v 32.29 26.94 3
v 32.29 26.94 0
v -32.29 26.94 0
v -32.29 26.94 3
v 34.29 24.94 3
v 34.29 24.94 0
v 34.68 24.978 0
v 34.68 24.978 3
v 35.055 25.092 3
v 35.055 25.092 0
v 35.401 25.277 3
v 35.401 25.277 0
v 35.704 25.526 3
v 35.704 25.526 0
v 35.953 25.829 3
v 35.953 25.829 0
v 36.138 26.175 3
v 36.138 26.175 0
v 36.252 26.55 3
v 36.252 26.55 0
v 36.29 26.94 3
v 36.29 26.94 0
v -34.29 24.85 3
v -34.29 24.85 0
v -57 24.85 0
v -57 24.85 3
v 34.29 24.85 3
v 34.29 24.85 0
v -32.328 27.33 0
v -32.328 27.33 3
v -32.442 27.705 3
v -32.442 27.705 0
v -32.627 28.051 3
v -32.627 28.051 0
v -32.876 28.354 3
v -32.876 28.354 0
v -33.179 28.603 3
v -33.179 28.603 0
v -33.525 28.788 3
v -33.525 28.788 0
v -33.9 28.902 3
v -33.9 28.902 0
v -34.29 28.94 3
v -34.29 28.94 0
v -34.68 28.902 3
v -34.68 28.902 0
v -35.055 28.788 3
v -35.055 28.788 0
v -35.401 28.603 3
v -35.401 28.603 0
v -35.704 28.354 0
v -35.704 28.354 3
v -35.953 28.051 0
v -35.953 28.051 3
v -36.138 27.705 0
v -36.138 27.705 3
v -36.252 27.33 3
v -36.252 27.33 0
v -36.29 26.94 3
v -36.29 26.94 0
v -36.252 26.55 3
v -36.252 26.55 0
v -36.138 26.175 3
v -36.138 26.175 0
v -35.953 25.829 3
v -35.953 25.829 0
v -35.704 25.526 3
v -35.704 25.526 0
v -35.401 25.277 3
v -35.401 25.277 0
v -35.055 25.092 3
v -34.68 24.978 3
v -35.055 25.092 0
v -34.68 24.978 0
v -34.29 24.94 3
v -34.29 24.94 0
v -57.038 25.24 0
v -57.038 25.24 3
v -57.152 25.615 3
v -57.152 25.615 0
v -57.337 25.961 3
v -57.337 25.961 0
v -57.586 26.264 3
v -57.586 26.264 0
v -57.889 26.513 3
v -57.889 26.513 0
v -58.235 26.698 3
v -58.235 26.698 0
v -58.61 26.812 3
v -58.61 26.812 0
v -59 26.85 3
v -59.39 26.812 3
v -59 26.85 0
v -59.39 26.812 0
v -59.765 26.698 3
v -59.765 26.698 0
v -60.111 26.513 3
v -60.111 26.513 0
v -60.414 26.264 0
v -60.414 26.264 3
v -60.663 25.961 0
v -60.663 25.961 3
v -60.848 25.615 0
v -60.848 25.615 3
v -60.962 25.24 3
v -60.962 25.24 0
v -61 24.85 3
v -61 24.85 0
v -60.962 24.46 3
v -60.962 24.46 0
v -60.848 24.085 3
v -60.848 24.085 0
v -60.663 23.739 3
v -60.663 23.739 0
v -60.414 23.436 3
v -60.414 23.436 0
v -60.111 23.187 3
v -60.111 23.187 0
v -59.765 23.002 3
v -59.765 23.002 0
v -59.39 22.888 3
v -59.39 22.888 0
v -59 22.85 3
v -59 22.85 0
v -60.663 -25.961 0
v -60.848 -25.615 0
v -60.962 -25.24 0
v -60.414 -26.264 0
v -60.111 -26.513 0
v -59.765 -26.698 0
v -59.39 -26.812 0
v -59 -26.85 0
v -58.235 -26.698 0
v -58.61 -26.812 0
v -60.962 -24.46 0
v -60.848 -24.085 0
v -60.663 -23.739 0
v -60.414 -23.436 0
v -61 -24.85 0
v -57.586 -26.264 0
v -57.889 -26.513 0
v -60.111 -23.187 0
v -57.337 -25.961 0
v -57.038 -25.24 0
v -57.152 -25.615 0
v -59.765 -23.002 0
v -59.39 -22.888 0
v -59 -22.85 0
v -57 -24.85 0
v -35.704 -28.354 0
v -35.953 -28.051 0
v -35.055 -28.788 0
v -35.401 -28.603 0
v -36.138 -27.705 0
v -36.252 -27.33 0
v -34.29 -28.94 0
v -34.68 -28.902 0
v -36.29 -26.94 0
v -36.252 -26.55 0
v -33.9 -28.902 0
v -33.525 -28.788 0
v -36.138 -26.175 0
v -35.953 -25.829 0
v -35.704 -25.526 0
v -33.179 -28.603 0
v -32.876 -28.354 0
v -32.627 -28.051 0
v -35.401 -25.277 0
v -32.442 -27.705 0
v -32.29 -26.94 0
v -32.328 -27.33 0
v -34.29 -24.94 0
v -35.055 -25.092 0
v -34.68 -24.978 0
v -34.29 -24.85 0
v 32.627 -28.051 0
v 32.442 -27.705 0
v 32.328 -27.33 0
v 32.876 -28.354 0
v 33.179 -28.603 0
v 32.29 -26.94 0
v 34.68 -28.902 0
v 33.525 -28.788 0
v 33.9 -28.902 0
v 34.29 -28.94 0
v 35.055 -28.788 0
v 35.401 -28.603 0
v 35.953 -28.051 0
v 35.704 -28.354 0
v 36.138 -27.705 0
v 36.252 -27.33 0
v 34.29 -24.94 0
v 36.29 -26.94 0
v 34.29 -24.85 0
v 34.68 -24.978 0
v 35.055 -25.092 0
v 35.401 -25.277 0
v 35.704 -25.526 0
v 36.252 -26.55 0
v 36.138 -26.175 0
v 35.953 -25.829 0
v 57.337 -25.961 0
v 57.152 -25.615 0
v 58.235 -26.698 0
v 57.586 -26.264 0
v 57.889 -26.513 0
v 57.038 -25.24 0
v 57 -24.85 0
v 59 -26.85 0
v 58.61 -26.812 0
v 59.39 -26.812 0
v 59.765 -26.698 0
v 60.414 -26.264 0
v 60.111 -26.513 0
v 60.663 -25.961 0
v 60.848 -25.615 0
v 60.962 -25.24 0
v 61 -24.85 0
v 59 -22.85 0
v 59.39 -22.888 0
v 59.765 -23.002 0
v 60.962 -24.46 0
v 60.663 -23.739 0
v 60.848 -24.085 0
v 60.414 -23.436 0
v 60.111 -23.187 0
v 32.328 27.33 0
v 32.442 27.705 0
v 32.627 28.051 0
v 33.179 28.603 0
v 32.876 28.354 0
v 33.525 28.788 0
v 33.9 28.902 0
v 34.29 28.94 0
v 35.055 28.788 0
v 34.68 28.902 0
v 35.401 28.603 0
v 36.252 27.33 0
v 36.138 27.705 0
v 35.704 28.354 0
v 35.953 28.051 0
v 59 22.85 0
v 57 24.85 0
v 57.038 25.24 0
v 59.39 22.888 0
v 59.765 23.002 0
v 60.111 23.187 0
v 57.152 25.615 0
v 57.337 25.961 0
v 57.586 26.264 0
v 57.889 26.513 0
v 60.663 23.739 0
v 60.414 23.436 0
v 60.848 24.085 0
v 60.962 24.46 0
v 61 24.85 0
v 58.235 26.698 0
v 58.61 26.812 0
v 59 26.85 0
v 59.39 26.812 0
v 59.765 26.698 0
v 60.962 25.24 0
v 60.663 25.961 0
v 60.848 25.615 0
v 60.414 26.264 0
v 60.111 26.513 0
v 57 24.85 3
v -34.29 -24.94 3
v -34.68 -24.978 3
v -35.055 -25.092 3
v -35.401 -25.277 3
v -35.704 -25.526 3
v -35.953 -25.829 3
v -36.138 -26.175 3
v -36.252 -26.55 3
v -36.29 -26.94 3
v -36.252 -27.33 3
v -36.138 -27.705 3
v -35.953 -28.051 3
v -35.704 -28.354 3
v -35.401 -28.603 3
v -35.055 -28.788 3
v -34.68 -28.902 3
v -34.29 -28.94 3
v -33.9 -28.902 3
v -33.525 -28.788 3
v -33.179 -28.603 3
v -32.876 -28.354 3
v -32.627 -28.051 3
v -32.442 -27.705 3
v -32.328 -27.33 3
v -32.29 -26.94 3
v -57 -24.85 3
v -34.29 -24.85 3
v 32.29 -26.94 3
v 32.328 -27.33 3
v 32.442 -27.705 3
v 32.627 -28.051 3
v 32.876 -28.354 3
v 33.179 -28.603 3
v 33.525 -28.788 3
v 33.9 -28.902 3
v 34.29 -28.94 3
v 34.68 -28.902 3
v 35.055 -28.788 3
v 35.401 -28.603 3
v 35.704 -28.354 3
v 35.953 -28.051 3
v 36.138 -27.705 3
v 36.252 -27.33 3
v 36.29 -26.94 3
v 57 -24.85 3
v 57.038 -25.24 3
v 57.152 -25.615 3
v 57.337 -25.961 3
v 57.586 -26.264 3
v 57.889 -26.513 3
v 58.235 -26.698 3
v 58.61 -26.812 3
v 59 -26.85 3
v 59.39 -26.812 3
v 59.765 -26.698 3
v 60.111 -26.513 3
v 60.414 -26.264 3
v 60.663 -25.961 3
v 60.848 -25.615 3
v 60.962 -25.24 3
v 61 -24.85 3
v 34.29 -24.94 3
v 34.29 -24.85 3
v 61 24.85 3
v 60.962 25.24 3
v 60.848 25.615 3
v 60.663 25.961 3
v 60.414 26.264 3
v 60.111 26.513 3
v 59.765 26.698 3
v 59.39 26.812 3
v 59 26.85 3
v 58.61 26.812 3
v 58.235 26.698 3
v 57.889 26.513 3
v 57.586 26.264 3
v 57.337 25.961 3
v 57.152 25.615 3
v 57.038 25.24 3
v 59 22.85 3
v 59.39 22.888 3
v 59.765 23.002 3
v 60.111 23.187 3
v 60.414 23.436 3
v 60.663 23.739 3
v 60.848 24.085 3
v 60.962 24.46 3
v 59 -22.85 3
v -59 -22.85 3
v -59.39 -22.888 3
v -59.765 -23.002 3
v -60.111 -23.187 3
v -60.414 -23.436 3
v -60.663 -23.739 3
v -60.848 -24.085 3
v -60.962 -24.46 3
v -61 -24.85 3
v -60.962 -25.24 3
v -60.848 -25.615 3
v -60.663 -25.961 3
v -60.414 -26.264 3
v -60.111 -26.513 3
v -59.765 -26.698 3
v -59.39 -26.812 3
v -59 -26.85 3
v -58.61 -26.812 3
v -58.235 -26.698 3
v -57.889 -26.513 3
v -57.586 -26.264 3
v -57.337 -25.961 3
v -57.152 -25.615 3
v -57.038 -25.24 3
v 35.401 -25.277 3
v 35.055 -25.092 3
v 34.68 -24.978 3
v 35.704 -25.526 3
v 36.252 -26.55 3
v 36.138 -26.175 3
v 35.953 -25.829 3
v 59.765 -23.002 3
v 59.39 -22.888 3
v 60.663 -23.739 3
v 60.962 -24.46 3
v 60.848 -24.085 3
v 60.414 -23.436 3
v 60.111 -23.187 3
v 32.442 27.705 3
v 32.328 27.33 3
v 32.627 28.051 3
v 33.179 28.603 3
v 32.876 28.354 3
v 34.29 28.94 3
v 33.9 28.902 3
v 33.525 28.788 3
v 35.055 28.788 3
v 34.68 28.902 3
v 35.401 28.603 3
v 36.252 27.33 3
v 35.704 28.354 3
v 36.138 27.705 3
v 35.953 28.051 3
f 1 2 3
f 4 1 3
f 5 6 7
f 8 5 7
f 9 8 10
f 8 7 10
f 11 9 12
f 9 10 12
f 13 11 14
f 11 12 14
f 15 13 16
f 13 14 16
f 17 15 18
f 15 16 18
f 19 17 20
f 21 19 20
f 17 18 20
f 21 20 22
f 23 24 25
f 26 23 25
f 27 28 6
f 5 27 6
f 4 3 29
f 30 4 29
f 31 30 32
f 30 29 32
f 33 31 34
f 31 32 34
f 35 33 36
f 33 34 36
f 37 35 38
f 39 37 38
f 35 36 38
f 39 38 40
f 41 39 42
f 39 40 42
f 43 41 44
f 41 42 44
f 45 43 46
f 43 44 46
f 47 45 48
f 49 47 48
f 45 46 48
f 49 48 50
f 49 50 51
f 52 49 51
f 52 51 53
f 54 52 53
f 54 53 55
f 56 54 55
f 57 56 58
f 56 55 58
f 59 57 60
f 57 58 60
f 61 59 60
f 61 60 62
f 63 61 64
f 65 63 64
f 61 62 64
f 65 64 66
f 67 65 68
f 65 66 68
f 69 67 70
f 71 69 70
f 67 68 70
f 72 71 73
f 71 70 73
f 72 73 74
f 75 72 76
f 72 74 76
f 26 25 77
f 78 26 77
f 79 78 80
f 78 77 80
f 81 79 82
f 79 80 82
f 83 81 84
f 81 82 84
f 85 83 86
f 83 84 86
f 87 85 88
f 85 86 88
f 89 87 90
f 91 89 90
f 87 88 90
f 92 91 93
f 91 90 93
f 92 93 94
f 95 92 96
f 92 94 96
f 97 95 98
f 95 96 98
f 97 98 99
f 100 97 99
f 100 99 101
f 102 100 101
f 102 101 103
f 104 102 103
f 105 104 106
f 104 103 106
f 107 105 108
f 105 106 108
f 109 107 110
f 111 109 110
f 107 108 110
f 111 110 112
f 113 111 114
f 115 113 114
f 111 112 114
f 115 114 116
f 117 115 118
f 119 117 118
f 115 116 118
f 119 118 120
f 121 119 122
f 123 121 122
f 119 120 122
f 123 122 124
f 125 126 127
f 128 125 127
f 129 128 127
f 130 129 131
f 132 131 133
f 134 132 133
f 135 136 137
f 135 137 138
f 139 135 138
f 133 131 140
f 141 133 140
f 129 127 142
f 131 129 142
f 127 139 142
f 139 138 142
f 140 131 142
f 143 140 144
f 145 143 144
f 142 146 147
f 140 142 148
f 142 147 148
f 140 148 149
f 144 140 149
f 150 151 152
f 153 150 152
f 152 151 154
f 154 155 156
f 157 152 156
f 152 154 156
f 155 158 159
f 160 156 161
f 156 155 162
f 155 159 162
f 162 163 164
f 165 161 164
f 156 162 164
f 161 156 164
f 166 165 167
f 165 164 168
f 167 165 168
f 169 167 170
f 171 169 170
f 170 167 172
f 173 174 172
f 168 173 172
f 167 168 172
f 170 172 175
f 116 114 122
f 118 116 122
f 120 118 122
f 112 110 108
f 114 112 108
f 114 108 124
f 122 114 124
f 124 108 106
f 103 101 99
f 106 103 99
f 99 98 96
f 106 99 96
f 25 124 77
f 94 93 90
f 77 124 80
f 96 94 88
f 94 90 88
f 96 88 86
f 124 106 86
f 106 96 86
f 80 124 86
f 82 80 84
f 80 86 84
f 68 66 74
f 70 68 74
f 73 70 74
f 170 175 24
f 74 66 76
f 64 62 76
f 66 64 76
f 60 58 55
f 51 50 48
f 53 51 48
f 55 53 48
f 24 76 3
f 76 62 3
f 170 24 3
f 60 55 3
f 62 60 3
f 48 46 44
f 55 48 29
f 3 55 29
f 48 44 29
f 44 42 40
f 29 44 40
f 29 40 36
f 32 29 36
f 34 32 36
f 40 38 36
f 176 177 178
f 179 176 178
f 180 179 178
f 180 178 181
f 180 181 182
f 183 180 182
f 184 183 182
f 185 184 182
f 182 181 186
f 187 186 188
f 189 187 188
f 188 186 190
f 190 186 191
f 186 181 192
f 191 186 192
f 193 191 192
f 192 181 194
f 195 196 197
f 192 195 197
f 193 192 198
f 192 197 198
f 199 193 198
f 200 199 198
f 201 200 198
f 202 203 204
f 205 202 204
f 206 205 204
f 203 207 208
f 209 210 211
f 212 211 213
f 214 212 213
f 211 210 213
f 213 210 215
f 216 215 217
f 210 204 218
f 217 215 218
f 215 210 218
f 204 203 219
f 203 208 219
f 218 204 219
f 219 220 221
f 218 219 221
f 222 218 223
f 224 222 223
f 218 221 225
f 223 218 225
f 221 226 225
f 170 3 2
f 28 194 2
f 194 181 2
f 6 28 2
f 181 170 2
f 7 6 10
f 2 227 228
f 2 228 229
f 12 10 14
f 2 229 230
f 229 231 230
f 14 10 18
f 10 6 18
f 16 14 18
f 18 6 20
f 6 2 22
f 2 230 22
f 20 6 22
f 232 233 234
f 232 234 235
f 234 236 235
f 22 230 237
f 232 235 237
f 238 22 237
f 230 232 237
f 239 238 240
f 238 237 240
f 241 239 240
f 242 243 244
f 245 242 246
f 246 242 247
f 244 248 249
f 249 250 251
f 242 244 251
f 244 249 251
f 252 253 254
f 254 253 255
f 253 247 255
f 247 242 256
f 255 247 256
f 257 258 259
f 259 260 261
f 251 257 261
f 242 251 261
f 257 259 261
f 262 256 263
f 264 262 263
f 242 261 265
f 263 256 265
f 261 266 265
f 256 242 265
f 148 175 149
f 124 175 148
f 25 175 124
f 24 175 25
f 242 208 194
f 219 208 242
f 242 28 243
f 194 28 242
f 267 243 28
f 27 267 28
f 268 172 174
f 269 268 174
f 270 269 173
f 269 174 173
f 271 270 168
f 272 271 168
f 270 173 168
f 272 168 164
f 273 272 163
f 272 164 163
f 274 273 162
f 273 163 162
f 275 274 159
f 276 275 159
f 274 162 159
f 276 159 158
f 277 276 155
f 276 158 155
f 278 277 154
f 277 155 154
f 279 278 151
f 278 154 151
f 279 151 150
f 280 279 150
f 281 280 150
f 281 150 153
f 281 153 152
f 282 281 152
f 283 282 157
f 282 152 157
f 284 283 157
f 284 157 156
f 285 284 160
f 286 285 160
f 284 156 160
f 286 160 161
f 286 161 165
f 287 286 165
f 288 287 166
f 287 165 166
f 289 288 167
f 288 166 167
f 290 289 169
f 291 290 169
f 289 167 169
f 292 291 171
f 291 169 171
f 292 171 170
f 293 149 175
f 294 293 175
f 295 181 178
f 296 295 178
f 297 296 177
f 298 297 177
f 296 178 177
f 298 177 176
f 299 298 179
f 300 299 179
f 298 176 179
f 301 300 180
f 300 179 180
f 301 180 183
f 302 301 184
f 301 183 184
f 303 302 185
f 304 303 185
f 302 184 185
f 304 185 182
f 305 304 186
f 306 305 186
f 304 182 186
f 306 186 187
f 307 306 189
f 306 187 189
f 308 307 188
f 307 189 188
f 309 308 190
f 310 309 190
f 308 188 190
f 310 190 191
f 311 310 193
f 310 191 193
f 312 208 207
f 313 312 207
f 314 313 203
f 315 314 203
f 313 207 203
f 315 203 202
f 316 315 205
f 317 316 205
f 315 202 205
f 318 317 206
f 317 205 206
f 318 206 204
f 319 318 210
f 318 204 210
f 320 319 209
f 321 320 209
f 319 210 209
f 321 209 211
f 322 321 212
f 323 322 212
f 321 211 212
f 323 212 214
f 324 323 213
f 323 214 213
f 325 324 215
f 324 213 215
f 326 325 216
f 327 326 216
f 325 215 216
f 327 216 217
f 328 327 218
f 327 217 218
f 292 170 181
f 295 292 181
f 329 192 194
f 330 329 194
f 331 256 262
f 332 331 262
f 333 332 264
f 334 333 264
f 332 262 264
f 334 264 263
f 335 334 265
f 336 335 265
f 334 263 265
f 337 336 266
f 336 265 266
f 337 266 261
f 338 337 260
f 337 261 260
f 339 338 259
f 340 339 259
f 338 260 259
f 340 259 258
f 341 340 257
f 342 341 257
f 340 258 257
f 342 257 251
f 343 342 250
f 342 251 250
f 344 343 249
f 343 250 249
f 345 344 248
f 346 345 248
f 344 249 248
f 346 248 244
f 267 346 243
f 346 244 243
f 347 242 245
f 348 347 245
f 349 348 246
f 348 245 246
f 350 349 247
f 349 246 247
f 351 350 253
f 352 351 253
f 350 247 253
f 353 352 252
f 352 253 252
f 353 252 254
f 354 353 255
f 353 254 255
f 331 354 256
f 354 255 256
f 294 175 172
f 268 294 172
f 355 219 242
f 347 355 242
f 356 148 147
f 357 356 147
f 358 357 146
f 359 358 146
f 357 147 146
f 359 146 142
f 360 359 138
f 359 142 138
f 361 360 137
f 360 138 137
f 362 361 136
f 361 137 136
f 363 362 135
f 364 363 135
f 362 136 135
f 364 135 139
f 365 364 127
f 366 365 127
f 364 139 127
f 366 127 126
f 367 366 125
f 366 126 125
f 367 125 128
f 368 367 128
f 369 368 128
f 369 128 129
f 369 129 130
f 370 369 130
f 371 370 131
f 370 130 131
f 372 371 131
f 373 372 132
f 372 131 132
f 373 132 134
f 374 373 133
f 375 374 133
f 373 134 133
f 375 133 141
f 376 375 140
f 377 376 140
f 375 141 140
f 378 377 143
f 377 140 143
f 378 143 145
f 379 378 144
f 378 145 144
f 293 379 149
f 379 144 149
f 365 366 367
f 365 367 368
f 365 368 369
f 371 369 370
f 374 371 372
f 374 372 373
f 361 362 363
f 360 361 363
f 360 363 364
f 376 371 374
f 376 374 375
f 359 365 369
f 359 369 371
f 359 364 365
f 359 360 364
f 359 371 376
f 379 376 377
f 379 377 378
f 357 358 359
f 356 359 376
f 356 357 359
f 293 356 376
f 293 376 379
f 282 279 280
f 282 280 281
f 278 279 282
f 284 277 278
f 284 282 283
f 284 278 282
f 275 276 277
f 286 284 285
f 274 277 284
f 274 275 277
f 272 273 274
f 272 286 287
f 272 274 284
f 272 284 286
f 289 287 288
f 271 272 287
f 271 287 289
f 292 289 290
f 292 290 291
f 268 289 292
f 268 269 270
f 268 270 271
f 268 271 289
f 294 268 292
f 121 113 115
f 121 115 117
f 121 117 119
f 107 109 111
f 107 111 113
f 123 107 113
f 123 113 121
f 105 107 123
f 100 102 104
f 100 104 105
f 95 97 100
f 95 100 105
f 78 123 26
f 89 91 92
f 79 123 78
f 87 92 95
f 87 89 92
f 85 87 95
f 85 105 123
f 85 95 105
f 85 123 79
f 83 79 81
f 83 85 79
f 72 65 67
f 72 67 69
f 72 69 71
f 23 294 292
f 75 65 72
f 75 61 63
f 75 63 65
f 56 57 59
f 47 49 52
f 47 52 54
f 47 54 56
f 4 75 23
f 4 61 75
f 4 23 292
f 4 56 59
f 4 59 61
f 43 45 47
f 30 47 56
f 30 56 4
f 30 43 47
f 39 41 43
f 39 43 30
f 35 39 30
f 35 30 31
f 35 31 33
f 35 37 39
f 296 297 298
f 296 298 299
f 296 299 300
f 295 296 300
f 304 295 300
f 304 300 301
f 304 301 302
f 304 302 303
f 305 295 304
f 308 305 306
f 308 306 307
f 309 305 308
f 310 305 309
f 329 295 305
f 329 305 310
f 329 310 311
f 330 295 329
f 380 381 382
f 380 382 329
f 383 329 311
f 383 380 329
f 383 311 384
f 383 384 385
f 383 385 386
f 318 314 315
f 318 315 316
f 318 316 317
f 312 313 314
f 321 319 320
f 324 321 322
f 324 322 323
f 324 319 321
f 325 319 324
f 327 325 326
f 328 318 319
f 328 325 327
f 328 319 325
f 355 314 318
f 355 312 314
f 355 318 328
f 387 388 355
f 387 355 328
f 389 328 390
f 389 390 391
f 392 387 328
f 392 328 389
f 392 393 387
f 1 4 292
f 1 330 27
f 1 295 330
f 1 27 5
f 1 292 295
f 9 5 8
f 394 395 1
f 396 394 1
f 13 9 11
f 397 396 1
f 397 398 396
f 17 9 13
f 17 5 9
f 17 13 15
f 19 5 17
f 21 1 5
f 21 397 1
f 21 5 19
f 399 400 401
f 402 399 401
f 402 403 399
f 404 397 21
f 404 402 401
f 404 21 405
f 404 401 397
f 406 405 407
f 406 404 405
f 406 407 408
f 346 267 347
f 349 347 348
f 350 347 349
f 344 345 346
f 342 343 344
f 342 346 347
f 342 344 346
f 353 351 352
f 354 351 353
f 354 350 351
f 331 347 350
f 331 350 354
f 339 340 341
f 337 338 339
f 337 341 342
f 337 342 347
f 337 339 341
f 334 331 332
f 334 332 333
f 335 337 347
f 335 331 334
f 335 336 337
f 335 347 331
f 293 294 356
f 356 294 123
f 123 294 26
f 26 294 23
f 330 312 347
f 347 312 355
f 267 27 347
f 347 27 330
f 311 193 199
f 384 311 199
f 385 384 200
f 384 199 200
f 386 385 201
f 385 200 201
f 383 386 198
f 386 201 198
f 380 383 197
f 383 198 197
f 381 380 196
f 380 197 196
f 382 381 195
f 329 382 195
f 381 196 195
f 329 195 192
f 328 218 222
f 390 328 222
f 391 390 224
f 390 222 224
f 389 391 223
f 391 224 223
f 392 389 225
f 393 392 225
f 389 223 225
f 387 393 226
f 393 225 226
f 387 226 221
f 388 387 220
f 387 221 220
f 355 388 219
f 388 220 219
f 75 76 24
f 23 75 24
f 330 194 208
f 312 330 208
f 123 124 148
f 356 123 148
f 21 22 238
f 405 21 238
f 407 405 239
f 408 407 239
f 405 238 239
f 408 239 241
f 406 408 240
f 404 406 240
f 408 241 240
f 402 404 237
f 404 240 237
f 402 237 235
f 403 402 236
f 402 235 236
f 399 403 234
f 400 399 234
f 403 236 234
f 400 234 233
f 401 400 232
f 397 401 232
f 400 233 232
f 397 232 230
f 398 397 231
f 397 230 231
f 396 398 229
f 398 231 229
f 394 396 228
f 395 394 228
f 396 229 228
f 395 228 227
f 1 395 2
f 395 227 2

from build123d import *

# Parameters (mm, degrees)
F0_W     = 68.58
F0_H     = 49.7
F1_DEPTH = 3


with BuildPart() as f1:
    # F0 (on Top) → F1 (new body)
    with BuildSketch(Plane.XY):
        with BuildLine():
            ThreePointArc((-59, 22.85), (-57.5857864376, 23.4357864376), (-57, 24.85))
            Line((-57, 24.85), (-59, 24.85))
            Line((-59, 24.85), (-59, 22.85))
        make_face()
        with BuildLine():
            Line((-59, 24.85), (-57, 24.85))
            ThreePointArc((-57, 24.85), (-60.4142135624, 26.2642135624), (-59, 22.85))
            Line((-59, 22.85), (-59, 24.85))
        make_face()
        with BuildLine():
            Line((-34.29, 24.85), (-57, 24.85))
            ThreePointArc((-57, 24.85), (-57.5857864376, 23.4357864376), (-59, 22.85))
            Line((-59, 22.85), (-59, -22.85))
            ThreePointArc((-59, -22.85), (-57.5857864376, -23.4357864376), (-57, -24.85))
            Line((-57, -24.85), (-34.29, -24.85))
            Line((-34.29, -24.85), (-34.29, 24.85))
        make_face()
        with BuildLine():
            Line((-34.29, 24.94), (-34.29, 24.85))
            Line((-34.29, 24.85), (34.29, 24.85))
            Line((34.29, 24.85), (34.29, 24.94))
            ThreePointArc((34.29, 24.94), (32.8757864376, 25.5257864376), (32.29, 26.94))
            Line((32.29, 26.94), (-32.29, 26.94))
            ThreePointArc((-32.29, 26.94), (-32.8757864376, 25.5257864376), (-34.29, 24.94))
        make_face()
        Rectangle(F0_W, F0_H)
        with BuildLine():
            Line((57, 24.85), (34.29, 24.85))
            Line((34.29, 24.85), (34.29, -24.85))
            Line((34.29, -24.85), (57, -24.85))
            ThreePointArc((57, -24.85), (57.5857864376, -23.4357864376), (59, -22.85))
            Line((59, -22.85), (59, 22.85))
            ThreePointArc((59, 22.85), (57.5857864376, 23.4357864376), (57, 24.85))
        make_face()
        with BuildLine():
            ThreePointArc((-32.29, 26.94), (-35.7042135624, 28.3542135624), (-34.29, 24.94))
            Line((-34.29, 24.94), (-34.29, 26.94))
            Line((-34.29, 26.94), (-32.29, 26.94))
        make_face()
        with BuildLine():
            Line((-34.29, 26.94), (-34.29, 24.94))
            ThreePointArc((-34.29, 24.94), (-32.8757864376, 25.5257864376), (-32.29, 26.94))
            Line((-32.29, 26.94), (-34.29, 26.94))
        make_face()
        with BuildLine():
            Line((34.29, -24.85), (-34.29, -24.85))
            Line((-34.29, -24.85), (-34.29, -24.94))
            ThreePointArc((-34.29, -24.94), (-32.8757864376, -25.5257864376), (-32.29, -26.94))
            Line((-32.29, -26.94), (32.29, -26.94))
            ThreePointArc((32.29, -26.94), (32.8757864376, -25.5257864376), (34.29, -24.94))
            Line((34.29, -24.94), (34.29, -24.85))
        make_face()
        with BuildLine():
            ThreePointArc((-57, -24.85), (-57.5857864376, -23.4357864376), (-59, -22.85))
            Line((-59, -22.85), (-59, -24.85))
            Line((-59, -24.85), (-57, -24.85))
        make_face()
        with BuildLine():
            Line((-59, -24.85), (-59, -22.85))
            ThreePointArc((-59, -22.85), (-60.4142135624, -26.2642135624), (-57, -24.85))
            Line((-57, -24.85), (-59, -24.85))
        make_face()
        with BuildLine():
            ThreePointArc((61, 24.85), (59, 26.85), (57, 24.85))
            Line((57, 24.85), (59, 24.85))
            Line((59, 24.85), (59, 22.85))
            ThreePointArc((59, 22.85), (60.4142135624, 23.4357864376), (61, 24.85))
        make_face()
        with BuildLine():
            Line((59, 24.85), (57, 24.85))
            ThreePointArc((57, 24.85), (57.5857864376, 23.4357864376), (59, 22.85))
            Line((59, 22.85), (59, 24.85))
        make_face()
        with BuildLine():
            ThreePointArc((32.29, 26.94), (32.8757864376, 25.5257864376), (34.29, 24.94))
            Line((34.29, 24.94), (34.29, 26.94))
            Line((34.29, 26.94), (32.29, 26.94))
        make_face()
        with BuildLine():
            Line((34.29, 26.94), (34.29, 24.94))
            ThreePointArc((34.29, 24.94), (35.7042135624, 25.5257864376), (36.29, 26.94))
            ThreePointArc((36.29, 26.94), (34.29, 28.94), (32.29, 26.94))
            Line((32.29, 26.94), (34.29, 26.94))
        make_face()
        with BuildLine():
            ThreePointArc((-32.29, -26.94), (-32.8757864376, -25.5257864376), (-34.29, -24.94))
            Line((-34.29, -24.94), (-34.29, -26.94))
            Line((-34.29, -26.94), (-32.29, -26.94))
        make_face()
        with BuildLine():
            Line((-34.29, -26.94), (-34.29, -24.94))
            ThreePointArc((-34.29, -24.94), (-35.7042135624, -28.3542135624), (-32.29, -26.94))
            Line((-32.29, -26.94), (-34.29, -26.94))
        make_face()
        with BuildLine():
            ThreePointArc((59, -22.85), (57.5857864376, -23.4357864376), (57, -24.85))
            Line((57, -24.85), (59, -24.85))
            Line((59, -24.85), (59, -22.85))
        make_face()
        with BuildLine():
            Line((59, -24.85), (57, -24.85))
            ThreePointArc((57, -24.85), (59, -26.85), (61, -24.85))
            ThreePointArc((61, -24.85), (60.4142135624, -23.4357864376), (59, -22.85))
            Line((59, -22.85), (59, -24.85))
        make_face()
        with BuildLine():
            ThreePointArc((36.29, -26.94), (35.7042135624, -25.5257864376), (34.29, -24.94))
            Line((34.29, -24.94), (34.29, -26.94))
            Line((34.29, -26.94), (32.29, -26.94))
            ThreePointArc((32.29, -26.94), (34.29, -28.94), (36.29, -26.94))
        make_face()
        with BuildLine():
            Line((34.29, -26.94), (34.29, -24.94))
            ThreePointArc((34.29, -24.94), (32.8757864376, -25.5257864376), (32.29, -26.94))
            Line((32.29, -26.94), (34.29, -26.94))
        make_face()
    extrude(amount=F1_DEPTH)


solid = f1.part
